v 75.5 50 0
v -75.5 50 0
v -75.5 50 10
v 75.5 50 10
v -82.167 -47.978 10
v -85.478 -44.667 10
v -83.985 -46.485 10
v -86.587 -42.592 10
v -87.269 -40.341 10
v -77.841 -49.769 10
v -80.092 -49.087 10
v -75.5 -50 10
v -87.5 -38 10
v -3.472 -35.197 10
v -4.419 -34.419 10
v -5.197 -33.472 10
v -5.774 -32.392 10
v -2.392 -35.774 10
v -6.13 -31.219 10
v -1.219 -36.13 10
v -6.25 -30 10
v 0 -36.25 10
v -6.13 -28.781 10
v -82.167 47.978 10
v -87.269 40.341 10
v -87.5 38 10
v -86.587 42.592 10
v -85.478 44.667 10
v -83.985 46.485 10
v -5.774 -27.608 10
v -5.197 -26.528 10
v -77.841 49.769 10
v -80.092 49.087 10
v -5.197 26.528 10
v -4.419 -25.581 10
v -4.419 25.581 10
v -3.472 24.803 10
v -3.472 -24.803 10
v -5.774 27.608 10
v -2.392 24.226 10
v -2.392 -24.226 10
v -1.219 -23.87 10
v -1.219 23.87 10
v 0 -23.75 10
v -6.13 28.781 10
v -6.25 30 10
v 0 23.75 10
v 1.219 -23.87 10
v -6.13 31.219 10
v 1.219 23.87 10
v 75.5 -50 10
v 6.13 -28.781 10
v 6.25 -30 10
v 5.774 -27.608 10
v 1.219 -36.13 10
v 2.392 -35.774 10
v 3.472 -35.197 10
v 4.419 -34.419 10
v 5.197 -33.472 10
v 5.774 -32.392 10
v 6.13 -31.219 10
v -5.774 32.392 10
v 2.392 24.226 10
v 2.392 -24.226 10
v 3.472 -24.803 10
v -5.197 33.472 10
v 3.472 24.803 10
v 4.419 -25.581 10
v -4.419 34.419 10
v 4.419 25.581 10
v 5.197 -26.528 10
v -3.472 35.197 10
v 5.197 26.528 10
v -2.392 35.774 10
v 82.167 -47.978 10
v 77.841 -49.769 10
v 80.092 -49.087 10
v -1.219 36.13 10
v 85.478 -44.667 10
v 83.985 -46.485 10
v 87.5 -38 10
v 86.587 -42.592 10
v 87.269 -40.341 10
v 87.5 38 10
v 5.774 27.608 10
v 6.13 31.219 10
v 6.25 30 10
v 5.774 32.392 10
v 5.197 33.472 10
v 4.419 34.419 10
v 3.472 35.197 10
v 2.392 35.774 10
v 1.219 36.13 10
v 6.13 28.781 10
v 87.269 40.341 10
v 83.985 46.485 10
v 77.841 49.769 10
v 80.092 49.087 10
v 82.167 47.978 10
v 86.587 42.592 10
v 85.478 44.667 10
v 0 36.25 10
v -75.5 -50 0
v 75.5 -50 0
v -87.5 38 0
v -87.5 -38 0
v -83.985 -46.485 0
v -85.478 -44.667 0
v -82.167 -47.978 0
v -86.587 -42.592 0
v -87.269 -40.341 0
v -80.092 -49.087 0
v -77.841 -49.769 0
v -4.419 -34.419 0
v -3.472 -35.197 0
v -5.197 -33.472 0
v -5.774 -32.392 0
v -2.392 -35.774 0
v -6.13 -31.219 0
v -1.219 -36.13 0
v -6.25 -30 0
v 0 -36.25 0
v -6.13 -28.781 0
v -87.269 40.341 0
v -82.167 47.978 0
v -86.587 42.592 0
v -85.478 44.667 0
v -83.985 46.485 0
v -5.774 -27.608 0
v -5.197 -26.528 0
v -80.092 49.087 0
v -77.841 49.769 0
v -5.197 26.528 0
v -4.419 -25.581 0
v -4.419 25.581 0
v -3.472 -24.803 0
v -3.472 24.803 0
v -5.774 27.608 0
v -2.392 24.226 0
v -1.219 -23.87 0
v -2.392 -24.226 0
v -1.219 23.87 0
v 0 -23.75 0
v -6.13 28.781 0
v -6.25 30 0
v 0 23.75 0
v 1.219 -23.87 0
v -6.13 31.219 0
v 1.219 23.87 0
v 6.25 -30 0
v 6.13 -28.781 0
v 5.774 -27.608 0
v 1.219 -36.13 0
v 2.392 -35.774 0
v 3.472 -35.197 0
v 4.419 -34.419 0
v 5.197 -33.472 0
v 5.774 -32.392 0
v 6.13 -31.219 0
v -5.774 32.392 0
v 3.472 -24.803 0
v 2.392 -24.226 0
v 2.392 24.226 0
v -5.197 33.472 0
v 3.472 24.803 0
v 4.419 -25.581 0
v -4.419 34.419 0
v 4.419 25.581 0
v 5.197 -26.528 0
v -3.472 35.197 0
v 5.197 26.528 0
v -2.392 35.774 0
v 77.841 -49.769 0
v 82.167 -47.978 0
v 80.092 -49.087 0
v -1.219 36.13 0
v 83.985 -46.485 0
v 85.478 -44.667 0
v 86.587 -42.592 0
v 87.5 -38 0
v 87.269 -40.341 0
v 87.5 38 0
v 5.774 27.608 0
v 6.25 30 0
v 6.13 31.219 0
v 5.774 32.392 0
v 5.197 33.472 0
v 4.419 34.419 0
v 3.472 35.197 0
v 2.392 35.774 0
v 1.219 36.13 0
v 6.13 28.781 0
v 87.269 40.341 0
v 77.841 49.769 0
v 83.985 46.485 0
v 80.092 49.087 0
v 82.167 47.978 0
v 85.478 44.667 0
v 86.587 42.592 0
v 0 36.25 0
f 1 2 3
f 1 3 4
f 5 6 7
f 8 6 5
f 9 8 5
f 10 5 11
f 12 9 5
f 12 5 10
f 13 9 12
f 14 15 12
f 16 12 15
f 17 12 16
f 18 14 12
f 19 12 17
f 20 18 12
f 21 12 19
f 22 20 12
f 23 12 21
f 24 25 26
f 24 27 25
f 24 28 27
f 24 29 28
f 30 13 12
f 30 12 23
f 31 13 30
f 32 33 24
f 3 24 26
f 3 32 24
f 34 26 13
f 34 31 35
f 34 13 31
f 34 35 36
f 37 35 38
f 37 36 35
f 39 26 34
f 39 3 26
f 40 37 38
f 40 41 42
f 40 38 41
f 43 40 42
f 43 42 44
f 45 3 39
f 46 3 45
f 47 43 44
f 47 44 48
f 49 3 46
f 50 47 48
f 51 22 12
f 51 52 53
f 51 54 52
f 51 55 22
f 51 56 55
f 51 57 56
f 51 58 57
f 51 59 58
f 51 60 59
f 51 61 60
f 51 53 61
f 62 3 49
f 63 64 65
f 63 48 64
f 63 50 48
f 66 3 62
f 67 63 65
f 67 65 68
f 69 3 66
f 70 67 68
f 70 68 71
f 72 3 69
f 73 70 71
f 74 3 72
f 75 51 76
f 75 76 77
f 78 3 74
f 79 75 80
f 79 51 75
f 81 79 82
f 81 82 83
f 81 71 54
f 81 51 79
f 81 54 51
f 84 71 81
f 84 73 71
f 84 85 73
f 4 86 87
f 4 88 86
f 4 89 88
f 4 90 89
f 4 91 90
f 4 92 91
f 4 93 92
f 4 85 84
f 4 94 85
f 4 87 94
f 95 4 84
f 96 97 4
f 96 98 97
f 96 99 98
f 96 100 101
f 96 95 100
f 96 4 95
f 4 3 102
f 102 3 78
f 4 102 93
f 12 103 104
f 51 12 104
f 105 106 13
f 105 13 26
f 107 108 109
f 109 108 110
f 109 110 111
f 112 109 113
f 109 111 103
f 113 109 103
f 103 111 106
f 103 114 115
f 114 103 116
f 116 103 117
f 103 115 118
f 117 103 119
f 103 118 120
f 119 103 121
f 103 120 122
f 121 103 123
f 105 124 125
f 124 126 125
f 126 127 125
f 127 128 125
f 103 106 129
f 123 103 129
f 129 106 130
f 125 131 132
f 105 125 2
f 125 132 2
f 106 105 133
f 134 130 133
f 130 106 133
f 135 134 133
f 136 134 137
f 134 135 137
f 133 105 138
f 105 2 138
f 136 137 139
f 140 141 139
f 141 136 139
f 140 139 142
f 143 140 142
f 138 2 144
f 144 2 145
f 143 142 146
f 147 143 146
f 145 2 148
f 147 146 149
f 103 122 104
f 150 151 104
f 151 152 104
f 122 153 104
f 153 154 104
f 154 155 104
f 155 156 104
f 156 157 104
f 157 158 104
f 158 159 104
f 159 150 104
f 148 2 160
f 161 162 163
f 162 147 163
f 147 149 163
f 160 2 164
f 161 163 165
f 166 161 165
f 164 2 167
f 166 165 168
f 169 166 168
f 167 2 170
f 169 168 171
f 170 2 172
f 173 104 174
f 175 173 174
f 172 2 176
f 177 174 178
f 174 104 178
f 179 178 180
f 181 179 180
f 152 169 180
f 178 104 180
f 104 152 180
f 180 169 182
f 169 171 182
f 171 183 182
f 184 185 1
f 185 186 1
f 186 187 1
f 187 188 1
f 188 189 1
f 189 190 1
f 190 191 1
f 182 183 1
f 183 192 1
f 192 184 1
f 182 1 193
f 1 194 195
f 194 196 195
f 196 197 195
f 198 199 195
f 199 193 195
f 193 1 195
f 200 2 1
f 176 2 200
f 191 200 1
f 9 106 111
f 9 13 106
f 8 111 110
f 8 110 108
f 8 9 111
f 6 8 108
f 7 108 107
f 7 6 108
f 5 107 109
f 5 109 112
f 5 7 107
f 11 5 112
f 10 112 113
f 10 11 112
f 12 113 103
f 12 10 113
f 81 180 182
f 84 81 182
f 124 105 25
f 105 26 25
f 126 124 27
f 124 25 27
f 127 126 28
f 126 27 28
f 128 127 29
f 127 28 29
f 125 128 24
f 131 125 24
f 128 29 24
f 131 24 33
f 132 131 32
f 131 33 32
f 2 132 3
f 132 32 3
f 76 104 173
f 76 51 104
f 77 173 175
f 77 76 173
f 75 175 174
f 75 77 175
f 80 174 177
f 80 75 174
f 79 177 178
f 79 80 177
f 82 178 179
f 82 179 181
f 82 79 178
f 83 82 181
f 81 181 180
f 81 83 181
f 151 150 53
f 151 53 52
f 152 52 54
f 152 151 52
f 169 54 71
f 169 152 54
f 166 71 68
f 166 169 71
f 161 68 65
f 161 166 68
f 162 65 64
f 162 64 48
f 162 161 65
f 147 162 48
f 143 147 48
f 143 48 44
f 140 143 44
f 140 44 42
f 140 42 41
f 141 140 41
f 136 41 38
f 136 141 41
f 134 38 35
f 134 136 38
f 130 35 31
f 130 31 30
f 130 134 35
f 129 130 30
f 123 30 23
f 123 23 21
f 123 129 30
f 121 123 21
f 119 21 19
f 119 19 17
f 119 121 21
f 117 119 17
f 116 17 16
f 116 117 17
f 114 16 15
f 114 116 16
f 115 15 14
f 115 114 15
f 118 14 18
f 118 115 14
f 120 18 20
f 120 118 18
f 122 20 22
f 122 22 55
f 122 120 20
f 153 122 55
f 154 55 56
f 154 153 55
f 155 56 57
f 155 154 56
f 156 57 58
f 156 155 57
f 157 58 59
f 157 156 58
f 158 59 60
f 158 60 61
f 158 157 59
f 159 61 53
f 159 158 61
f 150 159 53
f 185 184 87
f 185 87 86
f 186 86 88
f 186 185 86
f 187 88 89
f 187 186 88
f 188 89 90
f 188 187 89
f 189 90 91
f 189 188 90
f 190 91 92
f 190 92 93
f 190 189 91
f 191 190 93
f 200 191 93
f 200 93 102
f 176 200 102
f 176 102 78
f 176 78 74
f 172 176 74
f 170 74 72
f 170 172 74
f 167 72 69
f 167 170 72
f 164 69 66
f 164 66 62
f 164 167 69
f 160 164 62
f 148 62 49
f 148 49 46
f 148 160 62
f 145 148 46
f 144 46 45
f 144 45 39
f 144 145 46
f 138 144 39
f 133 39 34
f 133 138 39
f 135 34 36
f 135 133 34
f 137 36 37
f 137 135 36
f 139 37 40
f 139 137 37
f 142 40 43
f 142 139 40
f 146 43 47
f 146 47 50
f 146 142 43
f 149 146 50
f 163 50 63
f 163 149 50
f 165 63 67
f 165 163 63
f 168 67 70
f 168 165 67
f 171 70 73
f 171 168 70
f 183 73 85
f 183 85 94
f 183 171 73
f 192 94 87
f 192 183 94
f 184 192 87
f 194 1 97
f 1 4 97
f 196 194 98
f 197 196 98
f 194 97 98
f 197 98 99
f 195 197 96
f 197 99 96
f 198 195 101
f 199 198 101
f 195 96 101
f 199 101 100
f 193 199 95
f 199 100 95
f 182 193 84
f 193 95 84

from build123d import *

# Parameters (mm, degrees)
ESQUISSE1_W        = 175
ESQUISSE1_H        = 100
ESQUISSE1_R        = 6.25
BOSS_EXTRU_1_DEPTH = 10
CONG_1_R           = 12


with BuildPart() as part:
    # Esquisse1 → Boss.-Extru.1 (new body)
    with BuildSketch(Plane.XY):
        Rectangle(ESQUISSE1_W, ESQUISSE1_H)
        with Locations((0, 30)):
            Circle(ESQUISSE1_R, mode=Mode.SUBTRACT)
        with Locations((0, -30)):
            Circle(ESQUISSE1_R, mode=Mode.SUBTRACT)
    extrude(amount=BOSS_EXTRU_1_DEPTH)

    # Congé1
    cong_1_edges = [part.edges().sort_by_distance(p)[0] for p in [
        (87.5, -50, 5),
        (-87.5, -50, 5),
        (-87.5, 50, 5),
        (87.5, 50, 5),
    ]]
    fillet(cong_1_edges, radius=CONG_1_R)


solid = part.part
